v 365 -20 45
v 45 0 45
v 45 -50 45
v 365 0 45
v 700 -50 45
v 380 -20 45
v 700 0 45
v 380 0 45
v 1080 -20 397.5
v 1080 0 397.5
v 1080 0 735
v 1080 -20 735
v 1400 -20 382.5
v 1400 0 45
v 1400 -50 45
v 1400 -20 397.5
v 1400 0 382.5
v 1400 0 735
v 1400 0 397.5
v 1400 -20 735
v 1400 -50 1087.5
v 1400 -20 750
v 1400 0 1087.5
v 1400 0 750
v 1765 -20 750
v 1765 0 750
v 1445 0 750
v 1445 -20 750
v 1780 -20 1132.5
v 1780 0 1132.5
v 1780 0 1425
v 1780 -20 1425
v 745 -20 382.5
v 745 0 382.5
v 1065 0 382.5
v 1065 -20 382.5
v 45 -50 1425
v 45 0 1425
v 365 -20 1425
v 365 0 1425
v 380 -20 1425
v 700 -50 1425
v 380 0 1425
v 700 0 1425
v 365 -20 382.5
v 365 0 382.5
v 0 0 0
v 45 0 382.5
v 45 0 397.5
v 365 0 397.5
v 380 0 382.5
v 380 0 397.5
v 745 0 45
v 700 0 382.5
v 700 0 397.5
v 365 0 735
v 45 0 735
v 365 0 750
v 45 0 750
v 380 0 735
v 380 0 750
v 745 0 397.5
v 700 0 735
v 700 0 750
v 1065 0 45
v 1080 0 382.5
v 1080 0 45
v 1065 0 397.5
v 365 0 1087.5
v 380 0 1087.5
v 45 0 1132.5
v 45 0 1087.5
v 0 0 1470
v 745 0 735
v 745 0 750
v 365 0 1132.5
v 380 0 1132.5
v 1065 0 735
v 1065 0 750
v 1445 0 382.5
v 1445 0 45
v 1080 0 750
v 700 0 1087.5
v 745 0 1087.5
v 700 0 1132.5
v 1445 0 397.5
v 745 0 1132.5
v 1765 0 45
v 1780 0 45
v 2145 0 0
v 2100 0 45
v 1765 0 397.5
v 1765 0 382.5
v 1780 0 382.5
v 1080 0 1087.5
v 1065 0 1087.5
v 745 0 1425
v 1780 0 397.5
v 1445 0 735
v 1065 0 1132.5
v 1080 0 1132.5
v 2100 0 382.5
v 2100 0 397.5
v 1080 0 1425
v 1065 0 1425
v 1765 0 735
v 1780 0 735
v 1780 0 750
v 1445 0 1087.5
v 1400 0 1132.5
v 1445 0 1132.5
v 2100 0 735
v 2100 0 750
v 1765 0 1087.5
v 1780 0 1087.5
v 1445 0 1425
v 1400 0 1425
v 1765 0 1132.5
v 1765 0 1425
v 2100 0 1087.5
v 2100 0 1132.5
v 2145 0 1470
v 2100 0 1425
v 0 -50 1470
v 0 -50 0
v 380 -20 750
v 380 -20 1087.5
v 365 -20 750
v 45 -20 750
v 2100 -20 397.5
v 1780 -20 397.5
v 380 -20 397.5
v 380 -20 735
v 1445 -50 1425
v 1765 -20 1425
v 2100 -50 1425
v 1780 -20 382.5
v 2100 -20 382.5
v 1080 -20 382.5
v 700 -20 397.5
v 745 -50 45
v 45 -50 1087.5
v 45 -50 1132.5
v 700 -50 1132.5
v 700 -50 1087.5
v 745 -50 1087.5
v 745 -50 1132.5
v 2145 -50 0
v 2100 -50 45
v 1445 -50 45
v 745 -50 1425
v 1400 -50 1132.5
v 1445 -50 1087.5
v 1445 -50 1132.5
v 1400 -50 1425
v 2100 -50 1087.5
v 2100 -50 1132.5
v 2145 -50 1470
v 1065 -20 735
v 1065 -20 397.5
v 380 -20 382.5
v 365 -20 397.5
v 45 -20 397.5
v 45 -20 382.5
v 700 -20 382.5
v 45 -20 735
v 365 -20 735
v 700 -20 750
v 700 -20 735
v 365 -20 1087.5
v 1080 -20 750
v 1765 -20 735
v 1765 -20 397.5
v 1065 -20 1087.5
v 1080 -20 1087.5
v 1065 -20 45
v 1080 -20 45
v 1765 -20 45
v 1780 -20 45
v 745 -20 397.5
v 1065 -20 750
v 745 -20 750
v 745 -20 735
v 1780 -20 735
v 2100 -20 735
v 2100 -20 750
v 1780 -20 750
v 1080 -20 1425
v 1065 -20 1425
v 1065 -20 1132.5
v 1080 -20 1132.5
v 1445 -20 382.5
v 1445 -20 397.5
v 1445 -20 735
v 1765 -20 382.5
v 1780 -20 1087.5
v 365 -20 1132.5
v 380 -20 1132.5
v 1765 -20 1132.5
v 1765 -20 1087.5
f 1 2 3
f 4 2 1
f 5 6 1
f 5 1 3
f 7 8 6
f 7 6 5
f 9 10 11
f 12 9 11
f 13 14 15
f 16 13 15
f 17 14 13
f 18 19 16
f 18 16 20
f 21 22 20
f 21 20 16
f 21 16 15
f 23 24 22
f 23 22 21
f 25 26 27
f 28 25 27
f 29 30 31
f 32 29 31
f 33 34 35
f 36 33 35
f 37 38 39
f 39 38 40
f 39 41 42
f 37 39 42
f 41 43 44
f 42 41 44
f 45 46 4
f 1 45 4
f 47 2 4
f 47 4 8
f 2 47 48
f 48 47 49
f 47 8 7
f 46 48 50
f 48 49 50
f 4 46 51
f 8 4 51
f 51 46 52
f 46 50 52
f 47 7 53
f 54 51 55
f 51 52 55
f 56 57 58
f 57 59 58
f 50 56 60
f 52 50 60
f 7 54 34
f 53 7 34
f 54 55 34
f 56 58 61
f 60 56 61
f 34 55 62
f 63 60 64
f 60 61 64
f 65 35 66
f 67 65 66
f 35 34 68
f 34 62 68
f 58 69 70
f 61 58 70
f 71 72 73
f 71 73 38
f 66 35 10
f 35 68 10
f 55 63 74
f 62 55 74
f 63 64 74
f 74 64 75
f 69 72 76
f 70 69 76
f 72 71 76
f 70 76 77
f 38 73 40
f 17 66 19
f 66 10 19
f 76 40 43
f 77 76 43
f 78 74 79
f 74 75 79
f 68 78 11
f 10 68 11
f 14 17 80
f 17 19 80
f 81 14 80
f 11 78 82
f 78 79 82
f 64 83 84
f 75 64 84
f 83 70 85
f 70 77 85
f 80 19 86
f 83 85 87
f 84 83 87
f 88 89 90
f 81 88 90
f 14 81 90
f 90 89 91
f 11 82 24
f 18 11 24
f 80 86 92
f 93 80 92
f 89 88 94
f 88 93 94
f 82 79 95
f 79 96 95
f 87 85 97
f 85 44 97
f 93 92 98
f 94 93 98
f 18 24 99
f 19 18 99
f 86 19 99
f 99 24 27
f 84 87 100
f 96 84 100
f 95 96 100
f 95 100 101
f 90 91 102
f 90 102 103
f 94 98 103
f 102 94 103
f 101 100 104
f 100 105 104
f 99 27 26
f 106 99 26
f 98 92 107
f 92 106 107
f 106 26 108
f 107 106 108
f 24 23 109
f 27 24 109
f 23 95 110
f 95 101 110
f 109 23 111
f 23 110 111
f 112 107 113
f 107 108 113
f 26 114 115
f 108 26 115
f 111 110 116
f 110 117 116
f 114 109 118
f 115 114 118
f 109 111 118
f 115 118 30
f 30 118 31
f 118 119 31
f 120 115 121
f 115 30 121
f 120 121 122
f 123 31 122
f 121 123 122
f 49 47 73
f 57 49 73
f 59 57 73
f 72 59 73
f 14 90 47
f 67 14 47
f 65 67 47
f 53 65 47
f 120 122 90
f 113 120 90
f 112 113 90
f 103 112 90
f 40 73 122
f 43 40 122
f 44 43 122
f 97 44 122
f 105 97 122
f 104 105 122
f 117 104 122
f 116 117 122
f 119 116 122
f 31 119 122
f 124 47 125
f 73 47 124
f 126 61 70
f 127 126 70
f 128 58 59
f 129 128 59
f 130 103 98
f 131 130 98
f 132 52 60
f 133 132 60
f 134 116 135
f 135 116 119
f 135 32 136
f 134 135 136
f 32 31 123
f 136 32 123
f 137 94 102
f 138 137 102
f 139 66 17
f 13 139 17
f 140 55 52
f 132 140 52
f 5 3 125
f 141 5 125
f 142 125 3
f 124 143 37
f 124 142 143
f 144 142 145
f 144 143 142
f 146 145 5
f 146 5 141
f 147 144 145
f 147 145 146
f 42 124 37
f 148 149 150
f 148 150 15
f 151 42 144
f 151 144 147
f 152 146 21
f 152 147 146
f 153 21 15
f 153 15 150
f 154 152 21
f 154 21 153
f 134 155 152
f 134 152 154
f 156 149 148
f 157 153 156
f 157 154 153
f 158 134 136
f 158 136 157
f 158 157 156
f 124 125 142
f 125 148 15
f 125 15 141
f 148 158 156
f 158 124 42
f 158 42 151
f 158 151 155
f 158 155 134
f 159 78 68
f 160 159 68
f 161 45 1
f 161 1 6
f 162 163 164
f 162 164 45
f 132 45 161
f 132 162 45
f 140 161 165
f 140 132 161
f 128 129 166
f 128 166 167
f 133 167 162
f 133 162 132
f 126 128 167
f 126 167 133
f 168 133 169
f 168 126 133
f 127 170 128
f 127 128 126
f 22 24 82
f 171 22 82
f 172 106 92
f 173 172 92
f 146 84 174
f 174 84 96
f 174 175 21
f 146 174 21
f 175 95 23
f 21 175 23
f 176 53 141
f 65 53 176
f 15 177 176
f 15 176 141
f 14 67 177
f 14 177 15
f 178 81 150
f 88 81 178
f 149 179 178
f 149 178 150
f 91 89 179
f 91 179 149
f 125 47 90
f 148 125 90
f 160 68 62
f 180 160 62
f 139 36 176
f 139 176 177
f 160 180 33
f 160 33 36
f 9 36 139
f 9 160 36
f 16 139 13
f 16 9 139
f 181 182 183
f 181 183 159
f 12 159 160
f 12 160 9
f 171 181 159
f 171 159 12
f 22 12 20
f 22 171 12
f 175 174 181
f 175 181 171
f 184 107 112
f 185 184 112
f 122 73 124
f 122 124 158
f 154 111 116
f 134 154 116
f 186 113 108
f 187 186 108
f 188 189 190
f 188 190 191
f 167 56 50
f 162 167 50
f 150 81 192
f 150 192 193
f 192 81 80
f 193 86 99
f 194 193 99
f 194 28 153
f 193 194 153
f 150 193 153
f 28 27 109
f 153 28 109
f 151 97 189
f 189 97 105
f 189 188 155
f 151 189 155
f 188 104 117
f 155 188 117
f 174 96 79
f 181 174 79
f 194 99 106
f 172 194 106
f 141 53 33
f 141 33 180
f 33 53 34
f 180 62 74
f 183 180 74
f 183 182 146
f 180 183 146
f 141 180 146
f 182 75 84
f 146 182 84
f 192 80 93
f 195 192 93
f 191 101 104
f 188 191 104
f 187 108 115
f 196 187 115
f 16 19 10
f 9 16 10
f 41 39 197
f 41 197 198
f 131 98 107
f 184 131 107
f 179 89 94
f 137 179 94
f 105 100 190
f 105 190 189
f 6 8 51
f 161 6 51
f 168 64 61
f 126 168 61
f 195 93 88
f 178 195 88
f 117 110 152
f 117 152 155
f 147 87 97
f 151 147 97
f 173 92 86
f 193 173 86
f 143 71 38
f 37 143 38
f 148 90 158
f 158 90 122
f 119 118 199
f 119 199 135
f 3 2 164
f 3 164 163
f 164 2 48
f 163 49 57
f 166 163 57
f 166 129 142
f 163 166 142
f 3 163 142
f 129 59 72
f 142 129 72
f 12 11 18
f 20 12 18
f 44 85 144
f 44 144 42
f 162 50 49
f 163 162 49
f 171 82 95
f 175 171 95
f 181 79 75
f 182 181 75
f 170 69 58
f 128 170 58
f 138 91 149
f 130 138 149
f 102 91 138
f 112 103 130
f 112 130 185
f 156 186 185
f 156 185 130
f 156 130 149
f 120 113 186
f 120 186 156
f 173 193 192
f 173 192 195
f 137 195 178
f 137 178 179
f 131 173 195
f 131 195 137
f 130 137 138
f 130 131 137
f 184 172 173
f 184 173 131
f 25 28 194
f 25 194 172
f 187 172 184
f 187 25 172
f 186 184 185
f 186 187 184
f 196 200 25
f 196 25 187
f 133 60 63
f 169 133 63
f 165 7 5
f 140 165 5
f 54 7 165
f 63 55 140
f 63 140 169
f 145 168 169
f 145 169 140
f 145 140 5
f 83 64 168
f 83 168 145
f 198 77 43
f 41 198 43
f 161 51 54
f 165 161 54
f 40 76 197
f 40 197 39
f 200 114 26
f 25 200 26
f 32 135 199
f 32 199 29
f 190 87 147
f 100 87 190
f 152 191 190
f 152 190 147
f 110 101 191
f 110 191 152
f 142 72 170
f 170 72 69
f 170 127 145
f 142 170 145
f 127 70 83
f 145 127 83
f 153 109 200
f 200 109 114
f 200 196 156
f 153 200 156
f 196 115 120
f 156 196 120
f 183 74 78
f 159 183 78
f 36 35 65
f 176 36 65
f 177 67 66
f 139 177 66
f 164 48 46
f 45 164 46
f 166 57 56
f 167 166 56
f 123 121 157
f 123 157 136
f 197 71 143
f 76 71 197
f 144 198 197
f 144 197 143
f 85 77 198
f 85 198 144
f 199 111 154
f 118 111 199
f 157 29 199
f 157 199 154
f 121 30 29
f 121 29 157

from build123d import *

# Parameters (mm, degrees)
F0_W     = 2145
F0_H     = 1470
F0_W_2   = 655
F0_H_2   = 1042.5
F0_H_3   = 292.5
F1_DEPTH = 50
F2_W     = 15
F2_H     = 292.5
F3_DEPTH = 20


with BuildPart() as f1:
    # F0 (on Front) → F1 (new body)
    with BuildSketch(Plane.XZ):
        with Locations((1072.5, 735)):
            Rectangle(F0_W, F0_H)
        with Locations((372.5, 566.25)):
            Rectangle(F0_W_2, F0_H_2, mode=Mode.SUBTRACT)
        with Locations((1072.5, 566.25)):
            Rectangle(F0_W_2, F0_H_2, mode=Mode.SUBTRACT)
        with Locations((1772.5, 566.25)):
            Rectangle(F0_W_2, F0_H_2, mode=Mode.SUBTRACT)
        with Locations((372.5, 1278.75)):
            Rectangle(F0_W_2, F0_H_3, mode=Mode.SUBTRACT)
        with Locations((1072.5, 1278.75)):
            Rectangle(F0_W_2, F0_H_3, mode=Mode.SUBTRACT)
        with Locations((1772.5, 1278.75)):
            Rectangle(F0_W_2, F0_H_3, mode=Mode.SUBTRACT)
    extrude(amount=F1_DEPTH)

    # F2 (on Front) → F3 (join)
    with BuildSketch(Plane.XZ):
        Polygon((365, 750), (45, 750), (45, 735), (365, 735), (365, 397.5), (45, 397.5), (45, 382.5), (365, 382.5), (365, 45), (380, 45), (380, 382.5), (700, 382.5), (700, 397.5), (380, 397.5), (380, 735), (700, 735), (700, 750), (380, 750), (380, 1087.5), (365, 1087.5), align=None)
        with Locations((372.5, 1278.75)):
            Rectangle(F2_W, F2_H)
        with Locations((1072.5, 1278.75)):
            Rectangle(F2_W, F2_H)
        Polygon((1065, 750), (745, 750), (745, 735), (1065, 735), (1065, 397.5), (745, 397.5), (745, 382.5), (1065, 382.5), (1065, 45), (1080, 45), (1080, 382.5), (1400, 382.5), (1400, 397.5), (1080, 397.5), (1080, 735), (1400, 735), (1400, 750), (1080, 750), (1080, 1087.5), (1065, 1087.5), align=None)
        with Locations((1772.5, 1278.75)):
            Rectangle(F2_W, F2_H)
        Polygon((1780, 1087.5), (1765, 1087.5), (1765, 750), (1445, 750), (1445, 735), (1765, 735), (1765, 397.5), (1445, 397.5), (1445, 382.5), (1765, 382.5), (1765, 45), (1780, 45), (1780, 382.5), (2100, 382.5), (2100, 397.5), (1780, 397.5), (1780, 735), (2100, 735), (2100, 750), (1780, 750), align=None)
    extrude(amount=F3_DEPTH)


solid = f1.part
